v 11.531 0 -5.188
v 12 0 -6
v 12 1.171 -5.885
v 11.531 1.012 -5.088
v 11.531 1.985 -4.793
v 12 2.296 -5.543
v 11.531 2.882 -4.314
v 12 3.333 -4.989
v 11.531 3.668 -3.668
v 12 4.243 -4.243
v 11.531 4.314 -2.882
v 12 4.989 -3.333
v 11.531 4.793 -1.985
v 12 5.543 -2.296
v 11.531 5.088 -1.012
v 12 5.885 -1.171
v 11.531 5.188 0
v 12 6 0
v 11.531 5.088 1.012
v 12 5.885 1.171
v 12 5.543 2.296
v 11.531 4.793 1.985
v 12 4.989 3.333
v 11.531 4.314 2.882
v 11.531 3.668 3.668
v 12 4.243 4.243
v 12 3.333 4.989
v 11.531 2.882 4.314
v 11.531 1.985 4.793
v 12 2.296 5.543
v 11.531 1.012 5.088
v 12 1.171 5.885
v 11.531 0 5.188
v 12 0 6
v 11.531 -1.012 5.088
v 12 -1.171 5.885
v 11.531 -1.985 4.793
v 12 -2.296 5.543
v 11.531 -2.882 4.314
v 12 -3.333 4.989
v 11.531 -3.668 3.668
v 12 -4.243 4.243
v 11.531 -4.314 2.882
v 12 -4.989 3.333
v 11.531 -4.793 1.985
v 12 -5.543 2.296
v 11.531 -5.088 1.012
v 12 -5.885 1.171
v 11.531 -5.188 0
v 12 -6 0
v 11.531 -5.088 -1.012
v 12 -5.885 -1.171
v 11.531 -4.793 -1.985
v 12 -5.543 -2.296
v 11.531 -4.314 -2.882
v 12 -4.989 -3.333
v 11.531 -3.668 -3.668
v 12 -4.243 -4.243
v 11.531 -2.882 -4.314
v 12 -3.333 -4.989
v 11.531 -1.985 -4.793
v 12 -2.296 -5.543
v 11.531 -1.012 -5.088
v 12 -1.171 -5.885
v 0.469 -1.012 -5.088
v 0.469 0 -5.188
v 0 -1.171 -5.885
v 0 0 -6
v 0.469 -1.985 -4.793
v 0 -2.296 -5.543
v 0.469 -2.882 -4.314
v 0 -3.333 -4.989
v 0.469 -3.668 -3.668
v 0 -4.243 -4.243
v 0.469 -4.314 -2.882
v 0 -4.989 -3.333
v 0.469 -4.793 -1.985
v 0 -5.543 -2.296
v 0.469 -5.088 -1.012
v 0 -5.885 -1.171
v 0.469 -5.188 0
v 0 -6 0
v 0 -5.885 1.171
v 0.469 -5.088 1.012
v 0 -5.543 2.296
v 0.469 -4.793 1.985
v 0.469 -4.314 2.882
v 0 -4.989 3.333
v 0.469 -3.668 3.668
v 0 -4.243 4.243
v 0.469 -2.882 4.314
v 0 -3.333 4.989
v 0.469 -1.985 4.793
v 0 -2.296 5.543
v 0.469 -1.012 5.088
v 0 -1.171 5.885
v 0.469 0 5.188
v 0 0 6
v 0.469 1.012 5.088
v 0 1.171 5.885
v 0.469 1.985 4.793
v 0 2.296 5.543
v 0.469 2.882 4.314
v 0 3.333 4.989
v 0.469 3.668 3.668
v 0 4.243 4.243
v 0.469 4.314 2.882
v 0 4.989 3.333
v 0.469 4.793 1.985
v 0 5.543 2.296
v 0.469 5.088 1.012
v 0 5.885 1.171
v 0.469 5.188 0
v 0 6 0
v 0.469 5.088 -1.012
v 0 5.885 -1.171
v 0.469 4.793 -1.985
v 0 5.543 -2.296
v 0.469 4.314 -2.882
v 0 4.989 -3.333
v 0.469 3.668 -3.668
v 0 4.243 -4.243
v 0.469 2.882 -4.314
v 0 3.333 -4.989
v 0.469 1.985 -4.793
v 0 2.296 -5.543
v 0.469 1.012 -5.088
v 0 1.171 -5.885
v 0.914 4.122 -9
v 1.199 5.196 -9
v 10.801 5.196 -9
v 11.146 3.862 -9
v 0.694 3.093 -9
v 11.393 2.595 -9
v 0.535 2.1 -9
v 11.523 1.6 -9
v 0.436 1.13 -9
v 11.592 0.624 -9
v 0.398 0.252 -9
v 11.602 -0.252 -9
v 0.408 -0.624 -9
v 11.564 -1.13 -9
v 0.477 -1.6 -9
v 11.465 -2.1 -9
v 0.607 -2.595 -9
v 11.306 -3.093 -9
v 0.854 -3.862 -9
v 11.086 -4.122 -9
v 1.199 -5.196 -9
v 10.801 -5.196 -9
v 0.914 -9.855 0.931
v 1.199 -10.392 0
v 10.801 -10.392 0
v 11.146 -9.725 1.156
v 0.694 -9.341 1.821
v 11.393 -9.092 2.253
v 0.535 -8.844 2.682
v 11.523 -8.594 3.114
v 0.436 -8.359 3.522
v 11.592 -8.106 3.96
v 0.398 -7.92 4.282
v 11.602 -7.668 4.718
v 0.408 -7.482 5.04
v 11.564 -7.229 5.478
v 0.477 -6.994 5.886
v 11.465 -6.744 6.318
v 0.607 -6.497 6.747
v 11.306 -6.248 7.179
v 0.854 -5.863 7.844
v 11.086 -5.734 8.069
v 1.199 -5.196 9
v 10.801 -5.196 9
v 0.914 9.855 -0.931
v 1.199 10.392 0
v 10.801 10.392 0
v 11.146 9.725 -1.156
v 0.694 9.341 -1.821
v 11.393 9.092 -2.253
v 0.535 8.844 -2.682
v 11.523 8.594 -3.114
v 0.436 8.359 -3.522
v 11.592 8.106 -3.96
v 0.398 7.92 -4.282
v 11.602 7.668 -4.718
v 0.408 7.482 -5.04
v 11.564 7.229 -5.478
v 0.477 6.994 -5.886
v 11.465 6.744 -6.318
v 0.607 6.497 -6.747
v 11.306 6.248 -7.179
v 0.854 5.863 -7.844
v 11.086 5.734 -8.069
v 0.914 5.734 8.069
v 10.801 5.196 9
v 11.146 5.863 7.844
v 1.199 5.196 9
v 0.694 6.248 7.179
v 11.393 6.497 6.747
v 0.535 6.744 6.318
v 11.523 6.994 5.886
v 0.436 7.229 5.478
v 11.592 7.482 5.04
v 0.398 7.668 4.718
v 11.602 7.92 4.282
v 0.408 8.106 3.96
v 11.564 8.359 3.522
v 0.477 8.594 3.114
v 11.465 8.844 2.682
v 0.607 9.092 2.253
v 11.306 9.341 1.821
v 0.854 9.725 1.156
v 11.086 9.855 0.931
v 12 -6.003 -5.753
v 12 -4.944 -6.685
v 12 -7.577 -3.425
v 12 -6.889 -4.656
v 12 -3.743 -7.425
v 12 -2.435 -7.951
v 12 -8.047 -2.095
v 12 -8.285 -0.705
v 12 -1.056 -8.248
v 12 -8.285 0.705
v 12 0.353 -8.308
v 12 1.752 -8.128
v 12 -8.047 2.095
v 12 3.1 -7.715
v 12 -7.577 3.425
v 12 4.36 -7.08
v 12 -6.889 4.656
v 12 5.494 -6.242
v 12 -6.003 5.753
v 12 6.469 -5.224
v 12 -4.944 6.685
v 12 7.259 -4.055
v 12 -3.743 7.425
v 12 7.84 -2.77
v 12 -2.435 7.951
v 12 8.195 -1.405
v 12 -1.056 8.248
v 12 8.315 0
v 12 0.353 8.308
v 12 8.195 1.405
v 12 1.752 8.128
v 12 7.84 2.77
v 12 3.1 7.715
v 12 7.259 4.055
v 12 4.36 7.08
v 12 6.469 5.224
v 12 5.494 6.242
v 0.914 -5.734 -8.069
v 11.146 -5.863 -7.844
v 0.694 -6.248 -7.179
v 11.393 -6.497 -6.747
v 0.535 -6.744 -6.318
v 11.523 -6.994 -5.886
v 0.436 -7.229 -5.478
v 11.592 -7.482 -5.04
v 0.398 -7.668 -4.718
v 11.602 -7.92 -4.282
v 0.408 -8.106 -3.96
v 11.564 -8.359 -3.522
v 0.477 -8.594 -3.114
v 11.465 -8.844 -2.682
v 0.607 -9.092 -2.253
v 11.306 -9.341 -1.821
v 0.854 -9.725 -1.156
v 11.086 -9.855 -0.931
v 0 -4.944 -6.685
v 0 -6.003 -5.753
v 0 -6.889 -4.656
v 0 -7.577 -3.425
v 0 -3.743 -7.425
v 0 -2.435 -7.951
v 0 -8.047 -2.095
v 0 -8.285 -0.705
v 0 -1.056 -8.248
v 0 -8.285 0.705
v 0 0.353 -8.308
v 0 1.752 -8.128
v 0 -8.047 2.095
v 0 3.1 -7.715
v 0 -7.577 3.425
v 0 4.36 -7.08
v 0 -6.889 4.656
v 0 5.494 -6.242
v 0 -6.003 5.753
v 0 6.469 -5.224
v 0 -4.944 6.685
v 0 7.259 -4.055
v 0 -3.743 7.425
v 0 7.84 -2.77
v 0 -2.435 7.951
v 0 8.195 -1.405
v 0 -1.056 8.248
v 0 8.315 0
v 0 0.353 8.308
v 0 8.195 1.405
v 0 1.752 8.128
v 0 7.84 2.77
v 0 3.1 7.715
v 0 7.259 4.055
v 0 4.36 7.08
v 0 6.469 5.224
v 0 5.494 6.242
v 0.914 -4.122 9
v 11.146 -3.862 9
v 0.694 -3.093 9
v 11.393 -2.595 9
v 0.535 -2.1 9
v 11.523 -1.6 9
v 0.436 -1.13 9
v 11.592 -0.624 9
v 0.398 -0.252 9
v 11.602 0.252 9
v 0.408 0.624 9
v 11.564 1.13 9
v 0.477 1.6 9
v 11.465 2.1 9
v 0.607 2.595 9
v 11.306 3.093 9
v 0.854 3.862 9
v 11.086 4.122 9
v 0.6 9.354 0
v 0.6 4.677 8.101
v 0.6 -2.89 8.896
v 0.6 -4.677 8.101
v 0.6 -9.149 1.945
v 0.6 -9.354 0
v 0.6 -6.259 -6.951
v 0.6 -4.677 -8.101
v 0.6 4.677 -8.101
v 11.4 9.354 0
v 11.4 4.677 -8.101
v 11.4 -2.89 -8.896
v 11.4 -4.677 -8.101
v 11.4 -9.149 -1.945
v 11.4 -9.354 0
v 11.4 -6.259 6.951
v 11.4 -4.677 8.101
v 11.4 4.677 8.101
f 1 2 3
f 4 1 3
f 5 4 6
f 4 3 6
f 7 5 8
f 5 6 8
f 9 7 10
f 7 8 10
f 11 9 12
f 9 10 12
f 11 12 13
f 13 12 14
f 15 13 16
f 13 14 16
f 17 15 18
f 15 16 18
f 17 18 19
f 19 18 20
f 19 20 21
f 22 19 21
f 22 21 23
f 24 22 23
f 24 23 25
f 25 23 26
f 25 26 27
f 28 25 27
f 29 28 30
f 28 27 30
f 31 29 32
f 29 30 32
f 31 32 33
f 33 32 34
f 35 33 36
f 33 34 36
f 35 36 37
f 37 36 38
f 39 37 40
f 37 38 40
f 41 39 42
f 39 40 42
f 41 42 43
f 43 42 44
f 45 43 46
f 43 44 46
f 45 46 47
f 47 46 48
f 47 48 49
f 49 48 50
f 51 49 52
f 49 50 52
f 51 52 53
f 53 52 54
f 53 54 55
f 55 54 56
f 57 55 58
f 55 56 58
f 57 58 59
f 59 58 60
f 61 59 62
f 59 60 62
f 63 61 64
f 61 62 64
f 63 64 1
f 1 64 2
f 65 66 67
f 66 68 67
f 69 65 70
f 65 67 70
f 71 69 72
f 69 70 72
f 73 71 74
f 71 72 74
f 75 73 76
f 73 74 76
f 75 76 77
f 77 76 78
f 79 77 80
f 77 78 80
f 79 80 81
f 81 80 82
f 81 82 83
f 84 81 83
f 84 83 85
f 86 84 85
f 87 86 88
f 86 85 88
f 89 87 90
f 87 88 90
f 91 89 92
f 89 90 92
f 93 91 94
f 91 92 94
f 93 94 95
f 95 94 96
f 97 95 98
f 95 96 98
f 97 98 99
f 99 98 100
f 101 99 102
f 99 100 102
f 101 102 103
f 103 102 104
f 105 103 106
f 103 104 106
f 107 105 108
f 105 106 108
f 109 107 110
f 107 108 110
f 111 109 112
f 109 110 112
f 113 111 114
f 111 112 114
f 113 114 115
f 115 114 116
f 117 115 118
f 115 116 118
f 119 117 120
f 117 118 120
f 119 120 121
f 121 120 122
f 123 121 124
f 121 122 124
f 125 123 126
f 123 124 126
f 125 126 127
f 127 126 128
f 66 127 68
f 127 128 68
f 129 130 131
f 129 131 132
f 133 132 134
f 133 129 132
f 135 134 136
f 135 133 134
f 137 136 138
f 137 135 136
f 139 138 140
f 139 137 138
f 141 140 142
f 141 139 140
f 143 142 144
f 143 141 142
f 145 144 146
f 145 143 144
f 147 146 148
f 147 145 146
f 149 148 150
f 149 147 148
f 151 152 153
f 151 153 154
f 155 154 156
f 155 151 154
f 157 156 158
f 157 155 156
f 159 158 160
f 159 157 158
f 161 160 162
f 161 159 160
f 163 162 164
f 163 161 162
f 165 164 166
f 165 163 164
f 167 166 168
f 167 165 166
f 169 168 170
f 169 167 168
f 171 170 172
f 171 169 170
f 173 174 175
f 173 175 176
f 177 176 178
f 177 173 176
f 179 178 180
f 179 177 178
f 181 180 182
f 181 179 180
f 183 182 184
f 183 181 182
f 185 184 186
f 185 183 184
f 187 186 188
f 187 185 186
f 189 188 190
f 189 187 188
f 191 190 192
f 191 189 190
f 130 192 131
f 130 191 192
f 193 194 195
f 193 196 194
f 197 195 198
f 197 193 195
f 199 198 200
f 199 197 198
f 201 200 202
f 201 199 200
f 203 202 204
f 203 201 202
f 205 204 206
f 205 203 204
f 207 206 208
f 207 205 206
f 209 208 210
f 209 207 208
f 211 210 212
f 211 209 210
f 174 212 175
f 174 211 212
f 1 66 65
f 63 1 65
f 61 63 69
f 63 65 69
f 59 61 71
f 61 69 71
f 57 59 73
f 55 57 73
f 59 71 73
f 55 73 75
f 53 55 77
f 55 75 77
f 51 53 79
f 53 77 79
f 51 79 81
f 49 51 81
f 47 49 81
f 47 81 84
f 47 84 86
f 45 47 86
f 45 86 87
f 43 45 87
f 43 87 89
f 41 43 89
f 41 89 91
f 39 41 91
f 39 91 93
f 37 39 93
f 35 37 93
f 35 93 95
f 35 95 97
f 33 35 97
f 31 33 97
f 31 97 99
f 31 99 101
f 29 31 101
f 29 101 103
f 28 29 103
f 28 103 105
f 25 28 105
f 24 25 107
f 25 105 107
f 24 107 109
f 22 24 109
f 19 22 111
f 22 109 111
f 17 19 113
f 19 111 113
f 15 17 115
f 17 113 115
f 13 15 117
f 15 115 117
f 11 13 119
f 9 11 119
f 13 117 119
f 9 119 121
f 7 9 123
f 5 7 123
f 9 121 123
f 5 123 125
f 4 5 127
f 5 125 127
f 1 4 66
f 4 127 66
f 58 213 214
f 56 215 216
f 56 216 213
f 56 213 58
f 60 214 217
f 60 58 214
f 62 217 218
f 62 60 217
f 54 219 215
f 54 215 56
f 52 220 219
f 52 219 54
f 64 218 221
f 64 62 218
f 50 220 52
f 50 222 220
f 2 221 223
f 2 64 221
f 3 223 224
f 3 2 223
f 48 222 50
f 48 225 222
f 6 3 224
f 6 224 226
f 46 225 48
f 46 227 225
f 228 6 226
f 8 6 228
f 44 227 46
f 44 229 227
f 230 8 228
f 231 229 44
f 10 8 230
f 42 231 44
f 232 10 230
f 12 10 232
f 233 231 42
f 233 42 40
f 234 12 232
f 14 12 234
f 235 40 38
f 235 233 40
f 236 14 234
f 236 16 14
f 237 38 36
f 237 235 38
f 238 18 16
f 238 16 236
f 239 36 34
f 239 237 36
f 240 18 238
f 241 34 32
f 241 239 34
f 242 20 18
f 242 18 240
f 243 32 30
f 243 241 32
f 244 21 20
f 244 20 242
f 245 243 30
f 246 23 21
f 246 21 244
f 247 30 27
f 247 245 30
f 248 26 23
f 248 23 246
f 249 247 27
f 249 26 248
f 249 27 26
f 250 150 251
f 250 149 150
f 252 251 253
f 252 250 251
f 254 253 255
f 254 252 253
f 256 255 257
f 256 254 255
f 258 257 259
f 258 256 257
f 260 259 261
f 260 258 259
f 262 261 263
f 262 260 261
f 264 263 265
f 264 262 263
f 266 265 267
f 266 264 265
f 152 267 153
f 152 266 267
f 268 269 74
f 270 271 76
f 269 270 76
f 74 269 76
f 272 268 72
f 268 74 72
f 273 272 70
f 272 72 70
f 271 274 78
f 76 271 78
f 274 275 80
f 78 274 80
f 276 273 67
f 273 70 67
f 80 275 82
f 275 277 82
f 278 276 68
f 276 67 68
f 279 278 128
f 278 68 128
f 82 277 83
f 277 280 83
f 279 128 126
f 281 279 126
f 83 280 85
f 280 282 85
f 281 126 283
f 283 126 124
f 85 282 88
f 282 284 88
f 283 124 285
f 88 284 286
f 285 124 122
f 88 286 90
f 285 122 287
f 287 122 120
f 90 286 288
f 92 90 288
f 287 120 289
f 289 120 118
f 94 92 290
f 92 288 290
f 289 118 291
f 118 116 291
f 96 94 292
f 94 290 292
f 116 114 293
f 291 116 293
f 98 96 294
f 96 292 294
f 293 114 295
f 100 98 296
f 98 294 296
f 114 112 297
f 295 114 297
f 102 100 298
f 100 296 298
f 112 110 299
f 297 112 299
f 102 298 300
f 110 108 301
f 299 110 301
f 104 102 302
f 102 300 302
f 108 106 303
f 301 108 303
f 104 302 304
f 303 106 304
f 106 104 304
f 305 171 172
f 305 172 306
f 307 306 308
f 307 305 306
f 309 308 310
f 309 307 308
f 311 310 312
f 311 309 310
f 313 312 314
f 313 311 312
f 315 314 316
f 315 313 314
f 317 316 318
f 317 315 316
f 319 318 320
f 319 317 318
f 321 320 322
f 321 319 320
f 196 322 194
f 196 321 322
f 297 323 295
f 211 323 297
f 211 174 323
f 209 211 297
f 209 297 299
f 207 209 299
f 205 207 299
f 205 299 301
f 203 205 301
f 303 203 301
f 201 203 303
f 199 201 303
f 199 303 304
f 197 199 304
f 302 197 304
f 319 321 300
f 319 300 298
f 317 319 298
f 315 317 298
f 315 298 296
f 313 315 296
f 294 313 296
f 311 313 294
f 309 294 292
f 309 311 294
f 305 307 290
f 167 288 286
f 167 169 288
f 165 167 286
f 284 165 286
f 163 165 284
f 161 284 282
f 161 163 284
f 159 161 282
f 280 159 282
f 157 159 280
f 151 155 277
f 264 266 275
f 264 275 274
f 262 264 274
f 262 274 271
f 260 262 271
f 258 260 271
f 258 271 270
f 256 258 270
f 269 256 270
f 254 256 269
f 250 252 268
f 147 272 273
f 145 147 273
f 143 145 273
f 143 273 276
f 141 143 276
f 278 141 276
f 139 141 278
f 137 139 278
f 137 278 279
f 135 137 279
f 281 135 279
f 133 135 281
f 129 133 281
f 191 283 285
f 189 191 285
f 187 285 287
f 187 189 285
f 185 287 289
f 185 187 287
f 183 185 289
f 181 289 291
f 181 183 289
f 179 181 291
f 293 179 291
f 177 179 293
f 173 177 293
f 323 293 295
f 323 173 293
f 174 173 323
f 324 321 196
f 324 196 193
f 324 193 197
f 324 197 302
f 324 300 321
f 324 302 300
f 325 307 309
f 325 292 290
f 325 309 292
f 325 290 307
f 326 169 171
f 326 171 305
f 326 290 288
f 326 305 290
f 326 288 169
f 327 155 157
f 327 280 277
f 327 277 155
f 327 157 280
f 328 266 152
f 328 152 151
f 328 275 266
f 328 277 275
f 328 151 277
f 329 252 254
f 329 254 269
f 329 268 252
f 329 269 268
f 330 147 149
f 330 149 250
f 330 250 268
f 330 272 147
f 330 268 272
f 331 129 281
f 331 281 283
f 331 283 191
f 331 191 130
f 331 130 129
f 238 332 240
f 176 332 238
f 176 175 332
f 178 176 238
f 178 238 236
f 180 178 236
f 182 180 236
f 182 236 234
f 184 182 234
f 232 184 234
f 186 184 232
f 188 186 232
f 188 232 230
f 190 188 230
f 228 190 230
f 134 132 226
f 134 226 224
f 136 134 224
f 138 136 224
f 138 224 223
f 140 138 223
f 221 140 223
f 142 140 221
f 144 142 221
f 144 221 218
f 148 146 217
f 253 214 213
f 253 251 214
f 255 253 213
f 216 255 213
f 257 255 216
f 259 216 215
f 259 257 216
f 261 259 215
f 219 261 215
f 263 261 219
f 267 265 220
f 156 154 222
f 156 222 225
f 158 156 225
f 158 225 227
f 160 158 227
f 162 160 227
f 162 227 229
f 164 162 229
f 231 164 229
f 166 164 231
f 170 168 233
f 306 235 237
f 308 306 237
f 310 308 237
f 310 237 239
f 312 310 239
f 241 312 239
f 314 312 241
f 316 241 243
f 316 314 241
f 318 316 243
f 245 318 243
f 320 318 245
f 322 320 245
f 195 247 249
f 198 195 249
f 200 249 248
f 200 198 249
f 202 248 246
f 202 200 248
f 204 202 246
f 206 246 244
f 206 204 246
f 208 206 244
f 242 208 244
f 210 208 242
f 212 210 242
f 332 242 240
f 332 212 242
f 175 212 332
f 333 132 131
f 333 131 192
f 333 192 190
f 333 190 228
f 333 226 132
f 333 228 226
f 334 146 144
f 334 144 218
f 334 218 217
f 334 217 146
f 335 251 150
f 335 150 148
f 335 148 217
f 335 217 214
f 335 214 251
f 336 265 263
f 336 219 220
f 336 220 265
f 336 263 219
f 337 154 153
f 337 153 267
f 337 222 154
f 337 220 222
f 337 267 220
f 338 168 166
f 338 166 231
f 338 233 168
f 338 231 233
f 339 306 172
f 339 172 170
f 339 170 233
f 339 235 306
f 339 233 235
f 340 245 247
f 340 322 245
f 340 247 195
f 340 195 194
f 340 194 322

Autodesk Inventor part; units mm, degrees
ref_plane "YZ Plane" through (0, 0, 0) normal (1, 0, 0) x (0, 1, 0)
ref_plane "XZ Plane" through (0, 0, 0) normal (0, 1, 0) x (-1, 0, 0)
sketch "Skizze1" plane through (0, 0, 0) normal (1, 0, 0) x (0, 1, 0)
  line L0 (-10.3923, 0) -> (-5.1962, 9)
  line L1 (-5.1962, 9) -> (5.1962, 9)
  line L2 (5.1962, 9) -> (10.3923, 0)
  line L3 (10.3923, 0) -> (5.1962, -9)
  line L4 (5.1962, -9) -> (-5.1962, -9)
  line L5 (-5.1962, -9) -> (-10.3923, 0)
  point P0 (0, 0)
  point P1 (0, 0)
  dimension "d0" = 20.7846
extrude "Körper" add sketch "Skizze1" along normal blind 12
sketch "Skizze2" plane through (0, 0, 0) normal (0, 0, 1) x (1, 0, 0)
  line L0 (0, 5.1962) -> (0, 10.3923) projected
  line L1 (0, 10.3923) -> (12, 10.3923) projected
  line L2 (12, 5.1962) -> (12, 10.3923) projected
  line L3 (-2.4, 0) -> (14.4, 0) projected
  line L4 (1.1993, 10.3923) -> (0, 8.315)
  line L5 (10.8007, 10.3923) -> (12, 8.315)
  dimension "d3" = 30
  dimension "d4" = 30
  dimension "d5" = 16.63
  dimension "d6" = 16.63
revolve "Fase1" cut sketch "Skizze2" angle 360 about axis through (-10, 0, 0) along (1, 0, 0)
sketch "Skizze3" plane through (12, 0, 0) normal (1, 0, 0) x (0, 0, -1)
  arc A0 (-0.625, -1.0825) -> (0.625, -1.0825) centre (0, 0) ccw projected
hole "Gewinde" at (12, 0, 0) direction (-1, 0, 0) diameter 10.376 end through all thread size "M12x1.5" class "6H" standard "ISO Metric profile"
chamfer "Fase2" distance 0.8119 angle 30 1 edges at (12, 0, 5.188) measured on face at (12, 7.1795, -0.8718)
chamfer "Fase3" distance 0.8119 angle 30 1 edges at (0, 0, 5.188) measured on face at (0, 7.1795, -0.8718)
ref_plane "Work Plane1" through (-18.2456, 0, 0) normal (0, -0.8660254, -0.5) x (1, 0, 0)
equation "\"d0\" = 1.1547 * SW"
equation "\"d1\" = KOH"
equation "\"d3\" = ANG1"
equation "\"d4\" = ANG2"
equation "\"d5\" = SW0"
equation "\"d6\" = SW01"
equation "\"d8\" = -0.5 * GD1 + 0.5 * NND"
equation "\"d40\" = -0.5 * GD1 + 0.5 * NND"
equation "\"d10\" = -0.5 * GD1 + 0.5 * NND"
equation "\"d41\" = -0.5 * GD1 + 0.5 * NND"
equation "\"ANG1\" = 30deg"
equation "\"ANG2\" = 30deg"
equation "\"NND\" = 12"
equation "\"KOH\" = 12"
equation "\"SW\" = 18"
equation "\"SW0\" = 16.63"
equation "\"SW01\" = SW0"
equation "\"GUL\" = 0.541266 * PTC"
equation "\"THREADDIA\" = 12"
equation "\"TOA\" = 30deg"
equation "\"PTC\" = 1.5"
equation "\"E0\" = 20.03"
equation "\"GAL\" = 0.541266 * PTC"
equation "\"KOH1\" = 9.26"
equation "\"GD1\" = 10.376202"
properties part number "ISO 8674 - M12 x 1,5" material "Stahl"
